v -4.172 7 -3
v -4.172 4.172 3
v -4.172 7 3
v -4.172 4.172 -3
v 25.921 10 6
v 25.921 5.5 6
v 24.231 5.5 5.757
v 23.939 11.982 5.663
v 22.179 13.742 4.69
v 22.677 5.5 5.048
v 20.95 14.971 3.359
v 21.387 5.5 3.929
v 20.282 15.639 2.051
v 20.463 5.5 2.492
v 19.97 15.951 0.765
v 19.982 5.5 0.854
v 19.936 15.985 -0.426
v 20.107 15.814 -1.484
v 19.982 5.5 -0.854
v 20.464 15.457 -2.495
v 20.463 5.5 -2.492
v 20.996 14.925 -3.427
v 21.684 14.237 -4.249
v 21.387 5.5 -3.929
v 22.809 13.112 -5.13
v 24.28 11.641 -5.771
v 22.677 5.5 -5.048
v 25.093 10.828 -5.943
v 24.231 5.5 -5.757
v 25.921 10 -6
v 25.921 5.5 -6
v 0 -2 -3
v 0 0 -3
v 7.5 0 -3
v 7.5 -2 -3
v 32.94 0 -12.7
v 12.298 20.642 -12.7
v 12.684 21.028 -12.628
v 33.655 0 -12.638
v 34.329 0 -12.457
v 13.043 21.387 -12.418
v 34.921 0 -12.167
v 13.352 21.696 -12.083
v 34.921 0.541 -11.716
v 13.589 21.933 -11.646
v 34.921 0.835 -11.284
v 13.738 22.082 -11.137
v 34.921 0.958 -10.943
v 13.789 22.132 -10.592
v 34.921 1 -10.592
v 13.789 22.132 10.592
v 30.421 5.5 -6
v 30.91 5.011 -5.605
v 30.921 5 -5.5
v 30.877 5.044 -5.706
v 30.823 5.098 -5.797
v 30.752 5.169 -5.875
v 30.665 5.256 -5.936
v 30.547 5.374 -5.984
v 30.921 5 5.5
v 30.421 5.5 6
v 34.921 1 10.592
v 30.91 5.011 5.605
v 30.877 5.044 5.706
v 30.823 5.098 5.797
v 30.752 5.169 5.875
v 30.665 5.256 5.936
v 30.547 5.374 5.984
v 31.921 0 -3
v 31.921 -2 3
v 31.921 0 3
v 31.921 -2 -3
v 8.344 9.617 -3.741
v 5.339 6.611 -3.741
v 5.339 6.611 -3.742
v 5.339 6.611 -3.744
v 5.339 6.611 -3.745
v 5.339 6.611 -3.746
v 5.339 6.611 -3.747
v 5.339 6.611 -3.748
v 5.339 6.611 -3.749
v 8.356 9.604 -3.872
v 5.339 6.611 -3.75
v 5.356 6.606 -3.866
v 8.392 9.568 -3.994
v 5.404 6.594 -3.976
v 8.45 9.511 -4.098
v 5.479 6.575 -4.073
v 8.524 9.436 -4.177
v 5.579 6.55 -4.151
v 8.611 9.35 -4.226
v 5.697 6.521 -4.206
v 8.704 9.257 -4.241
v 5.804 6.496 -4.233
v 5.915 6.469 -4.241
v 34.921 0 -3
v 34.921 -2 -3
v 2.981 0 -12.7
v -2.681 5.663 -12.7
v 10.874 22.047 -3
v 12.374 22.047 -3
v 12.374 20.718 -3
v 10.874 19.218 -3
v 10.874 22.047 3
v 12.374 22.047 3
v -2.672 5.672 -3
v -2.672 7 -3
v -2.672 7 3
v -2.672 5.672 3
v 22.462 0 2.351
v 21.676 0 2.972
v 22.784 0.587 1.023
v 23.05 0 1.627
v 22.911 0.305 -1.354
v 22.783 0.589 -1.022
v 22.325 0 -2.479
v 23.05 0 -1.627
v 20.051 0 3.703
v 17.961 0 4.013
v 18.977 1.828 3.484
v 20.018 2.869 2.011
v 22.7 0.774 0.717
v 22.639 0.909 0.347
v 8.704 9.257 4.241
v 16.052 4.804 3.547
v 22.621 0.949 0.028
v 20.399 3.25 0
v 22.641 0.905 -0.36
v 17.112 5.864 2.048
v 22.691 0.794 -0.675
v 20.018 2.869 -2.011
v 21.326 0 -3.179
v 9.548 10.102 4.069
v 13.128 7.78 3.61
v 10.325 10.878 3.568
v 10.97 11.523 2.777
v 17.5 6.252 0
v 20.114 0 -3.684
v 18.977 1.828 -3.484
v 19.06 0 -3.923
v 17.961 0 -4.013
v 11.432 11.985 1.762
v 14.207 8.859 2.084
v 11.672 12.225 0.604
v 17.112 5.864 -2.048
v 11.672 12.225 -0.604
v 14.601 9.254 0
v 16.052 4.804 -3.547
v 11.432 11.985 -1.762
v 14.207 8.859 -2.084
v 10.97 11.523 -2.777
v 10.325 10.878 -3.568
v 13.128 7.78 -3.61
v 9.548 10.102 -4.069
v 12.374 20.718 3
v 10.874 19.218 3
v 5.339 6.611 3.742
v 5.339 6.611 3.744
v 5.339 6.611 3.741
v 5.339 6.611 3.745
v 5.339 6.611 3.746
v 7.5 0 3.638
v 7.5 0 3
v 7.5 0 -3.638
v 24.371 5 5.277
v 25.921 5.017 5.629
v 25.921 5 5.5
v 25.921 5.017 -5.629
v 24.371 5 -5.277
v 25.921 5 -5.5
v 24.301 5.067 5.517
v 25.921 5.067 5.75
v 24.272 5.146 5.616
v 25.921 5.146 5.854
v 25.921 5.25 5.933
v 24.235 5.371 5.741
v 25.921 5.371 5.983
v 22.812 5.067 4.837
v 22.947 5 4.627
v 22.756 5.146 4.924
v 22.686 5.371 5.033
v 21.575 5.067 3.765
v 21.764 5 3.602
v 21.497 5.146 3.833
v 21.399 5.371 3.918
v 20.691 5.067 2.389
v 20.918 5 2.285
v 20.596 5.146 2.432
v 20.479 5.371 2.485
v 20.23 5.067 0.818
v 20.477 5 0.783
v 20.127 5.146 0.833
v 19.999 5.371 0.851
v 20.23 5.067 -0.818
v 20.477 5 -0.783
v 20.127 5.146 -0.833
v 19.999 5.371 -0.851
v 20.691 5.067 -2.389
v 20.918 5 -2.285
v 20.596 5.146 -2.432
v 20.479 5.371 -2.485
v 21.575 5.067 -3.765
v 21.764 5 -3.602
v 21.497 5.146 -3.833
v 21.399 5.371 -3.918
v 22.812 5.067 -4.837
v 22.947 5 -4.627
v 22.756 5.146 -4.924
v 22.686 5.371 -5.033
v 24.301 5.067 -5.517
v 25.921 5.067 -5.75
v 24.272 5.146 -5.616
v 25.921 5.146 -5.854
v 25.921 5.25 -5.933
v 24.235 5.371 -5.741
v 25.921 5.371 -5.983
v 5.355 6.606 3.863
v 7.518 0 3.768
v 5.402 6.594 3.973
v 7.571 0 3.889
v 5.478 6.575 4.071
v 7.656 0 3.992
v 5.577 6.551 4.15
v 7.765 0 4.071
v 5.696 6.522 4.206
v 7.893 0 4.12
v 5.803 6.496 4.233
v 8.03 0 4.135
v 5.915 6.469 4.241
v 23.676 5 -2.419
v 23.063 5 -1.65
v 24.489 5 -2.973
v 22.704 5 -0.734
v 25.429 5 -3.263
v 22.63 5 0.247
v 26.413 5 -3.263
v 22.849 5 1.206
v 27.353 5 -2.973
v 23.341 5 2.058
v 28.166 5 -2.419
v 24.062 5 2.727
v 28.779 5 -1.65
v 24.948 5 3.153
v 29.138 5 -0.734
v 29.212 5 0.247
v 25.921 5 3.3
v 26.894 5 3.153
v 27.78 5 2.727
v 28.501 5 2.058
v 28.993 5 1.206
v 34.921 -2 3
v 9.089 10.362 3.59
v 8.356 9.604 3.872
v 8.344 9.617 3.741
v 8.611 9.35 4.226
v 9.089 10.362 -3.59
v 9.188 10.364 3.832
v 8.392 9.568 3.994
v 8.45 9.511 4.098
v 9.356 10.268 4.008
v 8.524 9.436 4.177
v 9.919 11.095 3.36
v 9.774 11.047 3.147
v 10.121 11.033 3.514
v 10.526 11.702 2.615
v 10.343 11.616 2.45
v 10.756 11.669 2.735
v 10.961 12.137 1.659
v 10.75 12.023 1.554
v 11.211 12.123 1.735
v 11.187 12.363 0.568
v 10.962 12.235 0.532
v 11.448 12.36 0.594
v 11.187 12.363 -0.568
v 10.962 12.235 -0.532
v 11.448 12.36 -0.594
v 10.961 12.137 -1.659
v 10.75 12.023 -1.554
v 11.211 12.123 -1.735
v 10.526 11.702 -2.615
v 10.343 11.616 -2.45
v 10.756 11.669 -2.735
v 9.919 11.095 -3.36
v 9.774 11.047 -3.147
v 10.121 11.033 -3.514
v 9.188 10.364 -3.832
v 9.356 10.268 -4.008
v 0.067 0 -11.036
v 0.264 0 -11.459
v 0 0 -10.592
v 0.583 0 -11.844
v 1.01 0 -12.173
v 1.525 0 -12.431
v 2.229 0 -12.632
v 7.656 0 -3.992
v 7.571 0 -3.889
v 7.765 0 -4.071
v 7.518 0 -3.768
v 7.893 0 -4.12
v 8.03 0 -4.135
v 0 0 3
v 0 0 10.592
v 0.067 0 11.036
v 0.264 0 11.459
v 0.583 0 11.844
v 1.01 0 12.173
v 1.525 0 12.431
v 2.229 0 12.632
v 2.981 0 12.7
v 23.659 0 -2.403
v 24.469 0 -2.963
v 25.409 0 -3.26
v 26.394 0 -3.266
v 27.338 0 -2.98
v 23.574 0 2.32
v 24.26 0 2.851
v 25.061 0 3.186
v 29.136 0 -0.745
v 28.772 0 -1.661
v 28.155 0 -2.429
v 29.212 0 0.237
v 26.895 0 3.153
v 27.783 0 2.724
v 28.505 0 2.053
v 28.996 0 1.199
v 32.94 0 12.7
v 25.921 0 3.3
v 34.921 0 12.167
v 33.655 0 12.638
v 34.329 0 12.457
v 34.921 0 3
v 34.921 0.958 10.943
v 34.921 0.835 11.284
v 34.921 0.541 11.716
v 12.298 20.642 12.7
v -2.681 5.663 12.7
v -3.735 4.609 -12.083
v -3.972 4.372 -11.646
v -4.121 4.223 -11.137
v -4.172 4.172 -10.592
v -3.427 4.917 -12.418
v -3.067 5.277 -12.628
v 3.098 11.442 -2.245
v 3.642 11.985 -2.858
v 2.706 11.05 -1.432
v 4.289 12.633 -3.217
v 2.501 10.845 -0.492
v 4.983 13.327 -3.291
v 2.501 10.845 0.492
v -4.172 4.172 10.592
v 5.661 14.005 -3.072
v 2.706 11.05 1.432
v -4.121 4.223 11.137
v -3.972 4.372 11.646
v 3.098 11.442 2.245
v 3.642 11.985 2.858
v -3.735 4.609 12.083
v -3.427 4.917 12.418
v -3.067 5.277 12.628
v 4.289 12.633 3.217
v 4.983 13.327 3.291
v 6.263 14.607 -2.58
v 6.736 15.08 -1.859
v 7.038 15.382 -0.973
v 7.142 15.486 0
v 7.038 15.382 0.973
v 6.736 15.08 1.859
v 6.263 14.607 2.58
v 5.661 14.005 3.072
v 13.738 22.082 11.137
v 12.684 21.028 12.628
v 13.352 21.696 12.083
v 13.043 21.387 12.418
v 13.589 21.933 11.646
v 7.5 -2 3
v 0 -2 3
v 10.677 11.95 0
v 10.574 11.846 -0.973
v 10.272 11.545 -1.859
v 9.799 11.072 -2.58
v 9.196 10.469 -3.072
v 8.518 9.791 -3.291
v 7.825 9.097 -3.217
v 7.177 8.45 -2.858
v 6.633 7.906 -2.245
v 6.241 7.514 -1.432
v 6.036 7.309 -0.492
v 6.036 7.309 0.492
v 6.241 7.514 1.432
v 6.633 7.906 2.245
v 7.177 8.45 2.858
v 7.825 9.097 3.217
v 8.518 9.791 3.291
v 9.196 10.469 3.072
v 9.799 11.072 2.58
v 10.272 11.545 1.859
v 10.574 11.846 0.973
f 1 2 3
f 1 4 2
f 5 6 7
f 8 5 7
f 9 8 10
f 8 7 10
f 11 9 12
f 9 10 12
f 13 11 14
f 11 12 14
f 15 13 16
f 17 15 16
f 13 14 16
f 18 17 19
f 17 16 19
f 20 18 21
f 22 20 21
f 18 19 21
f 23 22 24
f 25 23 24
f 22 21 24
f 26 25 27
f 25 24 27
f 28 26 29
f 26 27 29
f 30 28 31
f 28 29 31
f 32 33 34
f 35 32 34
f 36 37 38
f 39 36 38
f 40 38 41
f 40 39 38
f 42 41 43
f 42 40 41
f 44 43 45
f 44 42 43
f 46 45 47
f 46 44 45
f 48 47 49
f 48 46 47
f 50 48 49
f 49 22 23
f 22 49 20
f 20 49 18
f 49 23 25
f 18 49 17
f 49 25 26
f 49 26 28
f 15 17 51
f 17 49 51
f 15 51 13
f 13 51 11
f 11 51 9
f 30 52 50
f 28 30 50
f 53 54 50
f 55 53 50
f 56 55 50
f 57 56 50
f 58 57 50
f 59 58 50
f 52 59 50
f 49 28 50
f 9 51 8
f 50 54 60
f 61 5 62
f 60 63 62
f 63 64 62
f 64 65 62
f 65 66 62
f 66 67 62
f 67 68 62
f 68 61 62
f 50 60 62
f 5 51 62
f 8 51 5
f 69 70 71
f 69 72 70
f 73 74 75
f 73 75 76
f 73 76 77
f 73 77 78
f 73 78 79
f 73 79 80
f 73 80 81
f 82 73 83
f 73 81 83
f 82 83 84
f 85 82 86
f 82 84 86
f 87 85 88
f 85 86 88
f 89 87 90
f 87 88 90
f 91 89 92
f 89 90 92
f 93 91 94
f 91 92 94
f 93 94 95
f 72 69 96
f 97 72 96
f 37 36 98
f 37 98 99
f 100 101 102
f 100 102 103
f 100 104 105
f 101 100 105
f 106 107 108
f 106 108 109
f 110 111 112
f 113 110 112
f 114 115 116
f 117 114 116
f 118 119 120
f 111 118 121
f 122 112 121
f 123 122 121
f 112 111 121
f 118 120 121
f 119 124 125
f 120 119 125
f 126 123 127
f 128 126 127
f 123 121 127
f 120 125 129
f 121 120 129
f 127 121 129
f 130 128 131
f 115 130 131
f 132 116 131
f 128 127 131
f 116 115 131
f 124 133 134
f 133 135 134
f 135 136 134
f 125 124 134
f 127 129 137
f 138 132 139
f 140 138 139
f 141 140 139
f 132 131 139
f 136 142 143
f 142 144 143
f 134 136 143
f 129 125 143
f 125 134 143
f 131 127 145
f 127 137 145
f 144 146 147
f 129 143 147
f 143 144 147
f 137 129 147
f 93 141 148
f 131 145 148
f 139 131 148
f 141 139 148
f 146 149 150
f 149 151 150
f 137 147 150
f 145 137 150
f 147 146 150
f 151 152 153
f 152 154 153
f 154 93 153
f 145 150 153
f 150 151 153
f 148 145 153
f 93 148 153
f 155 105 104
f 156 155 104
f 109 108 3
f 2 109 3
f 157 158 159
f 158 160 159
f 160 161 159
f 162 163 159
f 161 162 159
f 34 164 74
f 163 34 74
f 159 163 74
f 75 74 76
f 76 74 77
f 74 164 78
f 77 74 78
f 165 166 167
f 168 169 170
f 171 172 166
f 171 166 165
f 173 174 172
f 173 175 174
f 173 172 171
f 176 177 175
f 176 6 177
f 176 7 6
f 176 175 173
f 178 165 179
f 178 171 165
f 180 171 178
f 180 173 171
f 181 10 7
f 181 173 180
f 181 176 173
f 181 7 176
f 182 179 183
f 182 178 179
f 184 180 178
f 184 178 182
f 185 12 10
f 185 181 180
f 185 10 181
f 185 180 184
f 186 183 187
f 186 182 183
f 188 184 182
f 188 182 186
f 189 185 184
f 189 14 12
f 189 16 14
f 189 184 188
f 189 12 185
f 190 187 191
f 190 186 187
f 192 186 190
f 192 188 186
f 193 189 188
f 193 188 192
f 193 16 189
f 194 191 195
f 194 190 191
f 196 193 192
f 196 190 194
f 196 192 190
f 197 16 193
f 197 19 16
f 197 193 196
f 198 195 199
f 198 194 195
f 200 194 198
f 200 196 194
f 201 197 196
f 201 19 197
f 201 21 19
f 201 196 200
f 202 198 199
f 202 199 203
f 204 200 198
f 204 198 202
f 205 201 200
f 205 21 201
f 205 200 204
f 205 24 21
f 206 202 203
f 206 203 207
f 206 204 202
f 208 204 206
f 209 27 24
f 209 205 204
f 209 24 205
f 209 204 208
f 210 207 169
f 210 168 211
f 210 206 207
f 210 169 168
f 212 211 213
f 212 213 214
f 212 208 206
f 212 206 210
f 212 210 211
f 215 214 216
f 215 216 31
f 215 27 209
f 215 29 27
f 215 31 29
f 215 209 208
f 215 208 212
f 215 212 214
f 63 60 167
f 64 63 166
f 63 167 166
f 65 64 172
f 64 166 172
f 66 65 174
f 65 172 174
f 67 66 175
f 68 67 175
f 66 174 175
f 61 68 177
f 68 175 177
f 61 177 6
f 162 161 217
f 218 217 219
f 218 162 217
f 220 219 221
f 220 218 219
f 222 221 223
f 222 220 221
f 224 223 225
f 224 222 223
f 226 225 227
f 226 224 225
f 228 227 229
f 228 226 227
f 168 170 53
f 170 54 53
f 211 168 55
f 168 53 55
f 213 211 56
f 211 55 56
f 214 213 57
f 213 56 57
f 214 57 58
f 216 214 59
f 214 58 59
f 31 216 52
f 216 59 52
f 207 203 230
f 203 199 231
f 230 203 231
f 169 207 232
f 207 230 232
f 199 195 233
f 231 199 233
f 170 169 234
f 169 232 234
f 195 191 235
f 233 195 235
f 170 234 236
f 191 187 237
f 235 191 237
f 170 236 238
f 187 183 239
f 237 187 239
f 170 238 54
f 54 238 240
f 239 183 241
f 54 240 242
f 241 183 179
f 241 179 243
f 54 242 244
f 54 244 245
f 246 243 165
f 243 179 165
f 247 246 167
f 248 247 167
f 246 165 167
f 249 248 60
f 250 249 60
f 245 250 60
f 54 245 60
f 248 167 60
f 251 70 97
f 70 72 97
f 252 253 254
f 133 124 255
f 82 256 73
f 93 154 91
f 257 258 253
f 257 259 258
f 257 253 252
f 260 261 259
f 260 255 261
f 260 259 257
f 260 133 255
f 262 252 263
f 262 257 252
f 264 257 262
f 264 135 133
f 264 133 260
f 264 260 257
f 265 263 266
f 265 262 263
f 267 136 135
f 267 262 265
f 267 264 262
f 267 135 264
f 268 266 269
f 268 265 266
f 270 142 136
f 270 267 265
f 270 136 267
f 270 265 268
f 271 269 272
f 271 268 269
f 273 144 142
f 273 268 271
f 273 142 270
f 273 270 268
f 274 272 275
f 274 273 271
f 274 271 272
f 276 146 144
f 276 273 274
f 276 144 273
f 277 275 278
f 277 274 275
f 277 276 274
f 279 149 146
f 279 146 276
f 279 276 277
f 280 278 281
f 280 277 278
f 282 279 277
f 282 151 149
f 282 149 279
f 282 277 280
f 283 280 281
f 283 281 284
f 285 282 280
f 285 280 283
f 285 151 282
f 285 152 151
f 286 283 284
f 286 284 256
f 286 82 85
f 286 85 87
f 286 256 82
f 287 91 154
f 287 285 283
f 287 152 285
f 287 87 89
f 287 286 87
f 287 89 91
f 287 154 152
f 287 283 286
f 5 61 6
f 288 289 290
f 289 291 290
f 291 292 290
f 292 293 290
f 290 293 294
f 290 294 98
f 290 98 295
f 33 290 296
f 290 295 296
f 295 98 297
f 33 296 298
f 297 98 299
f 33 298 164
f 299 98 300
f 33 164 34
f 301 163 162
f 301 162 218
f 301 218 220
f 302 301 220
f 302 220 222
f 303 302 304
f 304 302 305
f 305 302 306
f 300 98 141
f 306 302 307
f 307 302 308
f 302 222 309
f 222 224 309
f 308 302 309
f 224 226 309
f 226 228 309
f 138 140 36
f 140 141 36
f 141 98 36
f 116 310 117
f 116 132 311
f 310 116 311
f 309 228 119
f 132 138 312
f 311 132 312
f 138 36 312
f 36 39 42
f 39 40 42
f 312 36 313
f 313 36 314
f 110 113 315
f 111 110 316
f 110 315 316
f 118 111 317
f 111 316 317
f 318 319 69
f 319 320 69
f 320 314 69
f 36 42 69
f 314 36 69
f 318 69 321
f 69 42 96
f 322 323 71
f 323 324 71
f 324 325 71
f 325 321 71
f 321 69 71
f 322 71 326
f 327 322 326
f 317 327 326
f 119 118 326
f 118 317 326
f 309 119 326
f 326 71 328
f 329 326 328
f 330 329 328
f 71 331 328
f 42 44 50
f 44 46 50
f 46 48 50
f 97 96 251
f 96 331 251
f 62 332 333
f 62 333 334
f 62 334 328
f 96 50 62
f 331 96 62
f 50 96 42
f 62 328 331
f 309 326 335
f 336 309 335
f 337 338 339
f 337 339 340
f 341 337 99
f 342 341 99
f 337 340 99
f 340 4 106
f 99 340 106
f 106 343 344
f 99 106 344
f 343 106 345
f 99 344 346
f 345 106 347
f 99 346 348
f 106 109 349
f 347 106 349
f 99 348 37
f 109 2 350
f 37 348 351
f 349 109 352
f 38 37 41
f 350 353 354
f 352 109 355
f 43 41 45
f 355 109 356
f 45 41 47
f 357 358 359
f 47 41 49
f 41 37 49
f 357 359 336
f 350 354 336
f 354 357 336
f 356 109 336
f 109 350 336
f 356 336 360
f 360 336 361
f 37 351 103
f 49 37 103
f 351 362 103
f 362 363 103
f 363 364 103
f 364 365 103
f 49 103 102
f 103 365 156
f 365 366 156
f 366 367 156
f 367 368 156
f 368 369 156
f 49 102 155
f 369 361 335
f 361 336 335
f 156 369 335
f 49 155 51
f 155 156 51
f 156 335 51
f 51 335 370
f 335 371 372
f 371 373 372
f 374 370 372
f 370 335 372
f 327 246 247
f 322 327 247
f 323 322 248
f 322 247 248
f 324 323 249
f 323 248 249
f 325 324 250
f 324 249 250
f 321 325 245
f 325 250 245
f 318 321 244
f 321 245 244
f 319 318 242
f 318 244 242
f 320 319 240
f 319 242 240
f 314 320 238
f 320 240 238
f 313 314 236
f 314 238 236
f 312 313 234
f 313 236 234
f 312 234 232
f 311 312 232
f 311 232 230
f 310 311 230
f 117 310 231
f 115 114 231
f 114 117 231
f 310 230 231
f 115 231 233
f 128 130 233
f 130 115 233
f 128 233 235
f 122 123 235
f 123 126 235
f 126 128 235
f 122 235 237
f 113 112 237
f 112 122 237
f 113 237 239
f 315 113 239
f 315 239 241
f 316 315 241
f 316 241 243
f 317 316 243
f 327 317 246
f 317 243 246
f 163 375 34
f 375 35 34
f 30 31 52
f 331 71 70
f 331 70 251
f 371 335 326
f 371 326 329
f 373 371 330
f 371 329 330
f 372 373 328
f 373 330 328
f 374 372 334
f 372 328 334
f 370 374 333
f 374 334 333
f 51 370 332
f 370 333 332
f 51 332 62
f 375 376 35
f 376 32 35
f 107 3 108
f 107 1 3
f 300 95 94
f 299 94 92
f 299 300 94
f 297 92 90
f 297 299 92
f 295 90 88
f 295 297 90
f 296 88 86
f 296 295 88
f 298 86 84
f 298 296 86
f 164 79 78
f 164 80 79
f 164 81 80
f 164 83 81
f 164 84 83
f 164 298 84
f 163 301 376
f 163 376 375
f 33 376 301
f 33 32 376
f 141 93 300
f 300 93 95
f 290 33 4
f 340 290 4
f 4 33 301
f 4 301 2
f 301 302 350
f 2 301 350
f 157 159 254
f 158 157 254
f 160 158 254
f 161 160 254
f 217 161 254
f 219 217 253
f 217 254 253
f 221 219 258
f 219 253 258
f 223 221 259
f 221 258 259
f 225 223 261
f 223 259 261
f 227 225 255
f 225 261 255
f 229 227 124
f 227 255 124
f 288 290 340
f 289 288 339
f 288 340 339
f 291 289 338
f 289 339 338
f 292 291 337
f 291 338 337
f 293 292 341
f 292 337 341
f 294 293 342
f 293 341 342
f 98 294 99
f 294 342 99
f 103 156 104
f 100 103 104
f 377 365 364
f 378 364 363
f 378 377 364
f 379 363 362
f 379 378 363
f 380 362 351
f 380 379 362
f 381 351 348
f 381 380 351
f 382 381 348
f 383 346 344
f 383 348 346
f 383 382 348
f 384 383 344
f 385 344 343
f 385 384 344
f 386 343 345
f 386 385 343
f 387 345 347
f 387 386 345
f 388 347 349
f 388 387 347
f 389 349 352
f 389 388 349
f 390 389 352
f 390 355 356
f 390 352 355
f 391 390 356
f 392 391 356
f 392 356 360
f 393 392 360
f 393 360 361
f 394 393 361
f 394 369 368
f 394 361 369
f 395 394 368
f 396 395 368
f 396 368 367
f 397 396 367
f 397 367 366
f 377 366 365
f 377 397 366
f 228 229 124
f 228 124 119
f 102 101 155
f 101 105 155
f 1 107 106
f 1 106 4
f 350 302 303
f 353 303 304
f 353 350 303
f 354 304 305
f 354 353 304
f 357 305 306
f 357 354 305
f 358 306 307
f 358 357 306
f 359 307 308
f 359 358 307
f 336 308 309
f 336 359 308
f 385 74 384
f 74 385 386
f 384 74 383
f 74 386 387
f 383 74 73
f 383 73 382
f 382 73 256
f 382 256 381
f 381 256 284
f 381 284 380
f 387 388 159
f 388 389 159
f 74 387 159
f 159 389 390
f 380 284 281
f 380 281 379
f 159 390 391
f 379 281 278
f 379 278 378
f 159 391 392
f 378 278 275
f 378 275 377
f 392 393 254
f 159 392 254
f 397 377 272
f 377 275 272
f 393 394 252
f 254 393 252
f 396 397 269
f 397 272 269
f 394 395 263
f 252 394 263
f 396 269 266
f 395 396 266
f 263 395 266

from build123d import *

# Parameters (mm, degrees)
BOSS_EXTRUDE1_DEPTH            = 12.7
CUT_EXTRUDE1_START             = 5
SKETCH2_R                      = 3.3
CUT_EXTRUDE1_DEPTH             = 49.250583245
CUT_EXTRUDE2_DEPTH             = 41.918070929
FILLET1_R                      = 2.1082
FILLET2_R                      = 0.5
SKETCH4_W                      = 7.5
SKETCH4_H                      = 2
SKETCH4_W_2                    = 3
BOSS_EXTRUDE4_DEPTH            = 3
CUT_EXTRUDE3_START             = -5
SKETCH5_R                      = 3.3
CUT_EXTRUDE3_DEPTH             = 50.856761932
CUT_EXTRUDE4_DEPTH             = 44.447671501
CUT_EXTRUDE4_DRAFT             = -1
CUT_EXTRUDE5_REACH             = 45.251
CUT_EXTRUDE5_DIRECTION_2_REACH = 45.251
FILLET3_R                      = 0.5
FILLET4_R                      = 0.5


with BuildPart() as part:
    # Sketch1 → Boss-Extrude1 (new, symmetric)
    with BuildSketch(Plane.XY):
        Polygon((0, 0), (-4.171930009, 4.171930009), (13.788582233, 22.132442251), (34.921024484, 1), (34.921024484, 0), align=None)
    extrude(amount=BOSS_EXTRUDE1_DEPTH, both=True)

    # Sketch2 → Cut-Extrude1 (cut, through all)
    with BuildSketch(Plane(origin=(0, 0, 0), x_dir=(1, 0, 0), z_dir=(0, 1, 0)).offset(CUT_EXTRUDE1_START)):
        with Locations(Location((25.921024484, 0, 0), (0, 0, 270))):
            Circle(SKETCH2_R)
    extrude(amount=-CUT_EXTRUDE1_DEPTH, mode=Mode.SUBTRACT)

    # Sketch3 → Cut-Extrude2 (cut, through all)
    with BuildSketch(Plane.XZ.offset(-5)):
        with BuildLine():
            Line((25.921024484, -6), (35.921024484, -6))
            Line((35.921024484, -6), (35.921024484, 6))
            Line((35.921024484, 6), (25.921024484, 6))
            ThreePointArc((25.921024484, 6), (19.921024484, 0), (25.921024484, -6))
        make_face()
    extrude(amount=-CUT_EXTRUDE2_DEPTH, mode=Mode.SUBTRACT)

    # Fillet1
    fillet1_edges = [part.edges().sort_by_distance(p)[0] for p in [
        (-2.085965005, 2.085965005, -12.7),
        (-2.085965005, 2.085965005, 12.7),
        (24.354803359, 11.566221126, -12.7),
        (24.354803359, 11.566221126, 12.7),
    ]]
    fillet(fillet1_edges, radius=FILLET1_R)

    # Fillet2
    fillet2_edges = [part.edges().sort_by_distance(p)[0] for p in [
        (28.421024484, 5, -6),
        (28.421024484, 5, 6),
        (19.921024484, 5, 0),
    ]]
    fillet(fillet2_edges, radius=FILLET2_R)

    # Sketch4 → Boss-Extrude4 (add, symmetric)
    with BuildSketch(Plane.XY):
        with Locations((3.75, -1)):
            Rectangle(SKETCH4_W, SKETCH4_H)
        with Locations((33.421024484, -1)):
            Rectangle(SKETCH4_W_2, SKETCH4_H)
        Polygon((-4.171930009, 7.000357134), (-2.671930009, 7.000357134), (-2.671930009, 5.671930009), (-4.171930009, 4.171930009), align=None)
        Polygon((10.874368671, 22.046655814), (12.374368671, 22.046655814), (12.374368671, 20.718228689), (10.874368671, 19.218228689), align=None)
    extrude(amount=BOSS_EXTRUDE4_DEPTH, both=True)

    # Sketch5 → Cut-Extrude3 (cut, through all)
    with BuildSketch(Plane(origin=(-4.171930009, 4.171930009, 0), x_dir=(0, 0, 1), z_dir=(-0.7071067811865477, 0.7071067811865475, 0)).offset(CUT_EXTRUDE3_START)):
        with Locations(Location((0, 12.7, 0), (0, 0, 90))):
            Circle(SKETCH5_R)
    extrude(amount=CUT_EXTRUDE3_DEPTH, mode=Mode.SUBTRACT)


with BuildPart() as cut_extrude4_tool:
    # Sketch6 → Cut-Extrude4 (with draft: the straight prism first)
    with BuildSketch(Plane(origin=(-0.636396103, 0.636396103, 0), x_dir=(0, 0, 1), z_dir=(-0.7071067811865476, 0.7071067811865476, 0))):
        with BuildLine():
            Line((-4.25, 12.7), (-4.25, 8.45))
            Line((-4.25, 8.45), (4.25, 8.45))
            Line((4.25, 8.45), (4.25, 12.7))
            ThreePointArc((4.25, 12.7), (0, 16.95), (-4.25, 12.7))
        make_face()
    extrude(amount=-CUT_EXTRUDE4_DEPTH)
    # Cut-Extrude4: the draft: its side faces are tilted about the plane it starts from
    cut_extrude4_sides = [cut_extrude4_tool.faces().sort_by_distance(p)[0] for p in [
        (22.555883071, -7.600574649, -4.25),
        (21.053281161, -9.103176559, 0),
        (22.555883071, -7.600574649, 4.25),
        (27.063688801, -3.092768919, 0),
    ]]
    draft(cut_extrude4_sides, Plane(origin=(-0.636396103, 0.636396103, 0), x_dir=(0, 0, 1), z_dir=(-0.7071067811865476, 0.7071067811865476, 0)), CUT_EXTRUDE4_DRAFT)


with BuildPart() as part_1:
    add(part.part)

    # Cut-Extrude4: cut by cut_extrude4_tool
    add(cut_extrude4_tool.part, mode=Mode.SUBTRACT)

    # Cut-Extrude5: up to this plane
    cut_extrude5_end = Plane(origin=(8.343860018, 9.616652224, 4.25), z_dir=(0.012340714939826952, -0.012340714939826952, 0.9998476951563913))
    # Sketch7 → Cut-Extrude5 (cut, up to the surface)
    with BuildSketch(Plane.XY, mode=Mode.PRIVATE) as cut_extrude5_sk1:
        Polygon((12.185011438, 0), (7.5, 0), (5.338656198, 6.611448404), align=None)
    cut_extrude5_tool1 = split(extrude(cut_extrude5_sk1.sketch, amount=CUT_EXTRUDE5_REACH, mode=Mode.PRIVATE), bisect_by=cut_extrude5_end, keep=Keep.BOTH, mode=Mode.PRIVATE)
    add(cut_extrude5_tool1.solids().sort_by_distance((8.341223, 2.203816, 0))[0], mode=Mode.SUBTRACT)

    # Cut-Extrude5 direction 2: up to this plane
    cut_extrude5_direction_2_end = Plane(origin=(8.343860018, 9.616652224, -4.25), z_dir=(0.012340714939826952, -0.012340714939826952, -0.9998476951563913))
    # Sketch7 → Cut-Extrude5 direction 2 (cut, up to the surface)
    with BuildSketch(Plane.XY, mode=Mode.PRIVATE) as cut_extrude5_direction_2_sk1:
        Polygon((12.185011438, 0), (7.5, 0), (5.338656198, 6.611448404), align=None)
    cut_extrude5_direction_2_tool1 = split(extrude(cut_extrude5_direction_2_sk1.sketch, amount=-CUT_EXTRUDE5_DIRECTION_2_REACH, mode=Mode.PRIVATE), bisect_by=cut_extrude5_direction_2_end, keep=Keep.BOTH, mode=Mode.PRIVATE)
    add(cut_extrude5_direction_2_tool1.solids().sort_by_distance((8.341223, 2.203816, 0))[0], mode=Mode.SUBTRACT)

    # Fillet3
    fillet3_edges = [part_1.edges().sort_by_distance(p)[0] for p in [
        (11.349063838, 12.621856044, 0),
        (6.841258108, 8.114050314, -4.25),
        (6.841258108, 8.114050314, 4.25),
    ]]
    fillet(fillet3_edges, radius=FILLET3_R)

    # Fillet4
    # the kernel refuses this fillet: 0.5 mm, written as the material it adds along each edge
    with BuildSketch(Plane(origin=(7.891440115, -1.197396785, 4.122110611), x_dir=(0.9504313899021286, 0.31083412501895896, -0.007894289860799094), z_dir=(-0.3106893622953352, 0.9503840557787532, 0.015564918183075198))) as fillet4_piece_1_section:
        with BuildLine():
            CenterArc((FILLET4_R * 1.0079266613, FILLET4_R), FILLET4_R, 179.547631009, 90.452368991)
            Line((FILLET4_R * 0.00795782923952, FILLET4_R * 1.0078952463), (0, 0))
            Line((0, 0), (FILLET4_R * 1.0079266613, 0))
        make_face()
    fillet4_piece_1 = extrude(amount=8.905919631, mode=Mode.PRIVATE)
    fillet4_piece_1 = split(fillet4_piece_1, bisect_by=Plane(origin=(6.661619064, 0, 4.078163778), z_dir=(0, 1, 0)), keep=Keep.TOP, mode=Mode.PRIVATE)
    add(fillet4_piece_1)
    with BuildSketch(Plane(origin=(7.891440115, -1.197396785, -4.122110611), x_dir=(-0.004836440394139795, 0.014794442279442568, 0.9998788593234452), z_dir=(-0.3106893622953352, 0.9503840557787532, -0.015564918183075198))) as fillet4_piece_2_section:
        with BuildLine():
            CenterArc((FILLET4_R * 1.0079266613, FILLET4_R), FILLET4_R, 179.547631009, 90.452368991)
            Line((FILLET4_R * 0.00795782923952, FILLET4_R * 1.0078952463), (0, 0))
            Line((0, 0), (FILLET4_R * 1.0079266613, 0))
        make_face()
    fillet4_piece_2 = extrude(amount=8.905919631, mode=Mode.PRIVATE)
    fillet4_piece_2 = split(fillet4_piece_2, bisect_by=Plane(origin=(6.661619064, 0, -4.078163778), z_dir=(0, 1, 0)), keep=Keep.TOP, mode=Mode.PRIVATE)
    add(fillet4_piece_2)


solid = part_1.part
